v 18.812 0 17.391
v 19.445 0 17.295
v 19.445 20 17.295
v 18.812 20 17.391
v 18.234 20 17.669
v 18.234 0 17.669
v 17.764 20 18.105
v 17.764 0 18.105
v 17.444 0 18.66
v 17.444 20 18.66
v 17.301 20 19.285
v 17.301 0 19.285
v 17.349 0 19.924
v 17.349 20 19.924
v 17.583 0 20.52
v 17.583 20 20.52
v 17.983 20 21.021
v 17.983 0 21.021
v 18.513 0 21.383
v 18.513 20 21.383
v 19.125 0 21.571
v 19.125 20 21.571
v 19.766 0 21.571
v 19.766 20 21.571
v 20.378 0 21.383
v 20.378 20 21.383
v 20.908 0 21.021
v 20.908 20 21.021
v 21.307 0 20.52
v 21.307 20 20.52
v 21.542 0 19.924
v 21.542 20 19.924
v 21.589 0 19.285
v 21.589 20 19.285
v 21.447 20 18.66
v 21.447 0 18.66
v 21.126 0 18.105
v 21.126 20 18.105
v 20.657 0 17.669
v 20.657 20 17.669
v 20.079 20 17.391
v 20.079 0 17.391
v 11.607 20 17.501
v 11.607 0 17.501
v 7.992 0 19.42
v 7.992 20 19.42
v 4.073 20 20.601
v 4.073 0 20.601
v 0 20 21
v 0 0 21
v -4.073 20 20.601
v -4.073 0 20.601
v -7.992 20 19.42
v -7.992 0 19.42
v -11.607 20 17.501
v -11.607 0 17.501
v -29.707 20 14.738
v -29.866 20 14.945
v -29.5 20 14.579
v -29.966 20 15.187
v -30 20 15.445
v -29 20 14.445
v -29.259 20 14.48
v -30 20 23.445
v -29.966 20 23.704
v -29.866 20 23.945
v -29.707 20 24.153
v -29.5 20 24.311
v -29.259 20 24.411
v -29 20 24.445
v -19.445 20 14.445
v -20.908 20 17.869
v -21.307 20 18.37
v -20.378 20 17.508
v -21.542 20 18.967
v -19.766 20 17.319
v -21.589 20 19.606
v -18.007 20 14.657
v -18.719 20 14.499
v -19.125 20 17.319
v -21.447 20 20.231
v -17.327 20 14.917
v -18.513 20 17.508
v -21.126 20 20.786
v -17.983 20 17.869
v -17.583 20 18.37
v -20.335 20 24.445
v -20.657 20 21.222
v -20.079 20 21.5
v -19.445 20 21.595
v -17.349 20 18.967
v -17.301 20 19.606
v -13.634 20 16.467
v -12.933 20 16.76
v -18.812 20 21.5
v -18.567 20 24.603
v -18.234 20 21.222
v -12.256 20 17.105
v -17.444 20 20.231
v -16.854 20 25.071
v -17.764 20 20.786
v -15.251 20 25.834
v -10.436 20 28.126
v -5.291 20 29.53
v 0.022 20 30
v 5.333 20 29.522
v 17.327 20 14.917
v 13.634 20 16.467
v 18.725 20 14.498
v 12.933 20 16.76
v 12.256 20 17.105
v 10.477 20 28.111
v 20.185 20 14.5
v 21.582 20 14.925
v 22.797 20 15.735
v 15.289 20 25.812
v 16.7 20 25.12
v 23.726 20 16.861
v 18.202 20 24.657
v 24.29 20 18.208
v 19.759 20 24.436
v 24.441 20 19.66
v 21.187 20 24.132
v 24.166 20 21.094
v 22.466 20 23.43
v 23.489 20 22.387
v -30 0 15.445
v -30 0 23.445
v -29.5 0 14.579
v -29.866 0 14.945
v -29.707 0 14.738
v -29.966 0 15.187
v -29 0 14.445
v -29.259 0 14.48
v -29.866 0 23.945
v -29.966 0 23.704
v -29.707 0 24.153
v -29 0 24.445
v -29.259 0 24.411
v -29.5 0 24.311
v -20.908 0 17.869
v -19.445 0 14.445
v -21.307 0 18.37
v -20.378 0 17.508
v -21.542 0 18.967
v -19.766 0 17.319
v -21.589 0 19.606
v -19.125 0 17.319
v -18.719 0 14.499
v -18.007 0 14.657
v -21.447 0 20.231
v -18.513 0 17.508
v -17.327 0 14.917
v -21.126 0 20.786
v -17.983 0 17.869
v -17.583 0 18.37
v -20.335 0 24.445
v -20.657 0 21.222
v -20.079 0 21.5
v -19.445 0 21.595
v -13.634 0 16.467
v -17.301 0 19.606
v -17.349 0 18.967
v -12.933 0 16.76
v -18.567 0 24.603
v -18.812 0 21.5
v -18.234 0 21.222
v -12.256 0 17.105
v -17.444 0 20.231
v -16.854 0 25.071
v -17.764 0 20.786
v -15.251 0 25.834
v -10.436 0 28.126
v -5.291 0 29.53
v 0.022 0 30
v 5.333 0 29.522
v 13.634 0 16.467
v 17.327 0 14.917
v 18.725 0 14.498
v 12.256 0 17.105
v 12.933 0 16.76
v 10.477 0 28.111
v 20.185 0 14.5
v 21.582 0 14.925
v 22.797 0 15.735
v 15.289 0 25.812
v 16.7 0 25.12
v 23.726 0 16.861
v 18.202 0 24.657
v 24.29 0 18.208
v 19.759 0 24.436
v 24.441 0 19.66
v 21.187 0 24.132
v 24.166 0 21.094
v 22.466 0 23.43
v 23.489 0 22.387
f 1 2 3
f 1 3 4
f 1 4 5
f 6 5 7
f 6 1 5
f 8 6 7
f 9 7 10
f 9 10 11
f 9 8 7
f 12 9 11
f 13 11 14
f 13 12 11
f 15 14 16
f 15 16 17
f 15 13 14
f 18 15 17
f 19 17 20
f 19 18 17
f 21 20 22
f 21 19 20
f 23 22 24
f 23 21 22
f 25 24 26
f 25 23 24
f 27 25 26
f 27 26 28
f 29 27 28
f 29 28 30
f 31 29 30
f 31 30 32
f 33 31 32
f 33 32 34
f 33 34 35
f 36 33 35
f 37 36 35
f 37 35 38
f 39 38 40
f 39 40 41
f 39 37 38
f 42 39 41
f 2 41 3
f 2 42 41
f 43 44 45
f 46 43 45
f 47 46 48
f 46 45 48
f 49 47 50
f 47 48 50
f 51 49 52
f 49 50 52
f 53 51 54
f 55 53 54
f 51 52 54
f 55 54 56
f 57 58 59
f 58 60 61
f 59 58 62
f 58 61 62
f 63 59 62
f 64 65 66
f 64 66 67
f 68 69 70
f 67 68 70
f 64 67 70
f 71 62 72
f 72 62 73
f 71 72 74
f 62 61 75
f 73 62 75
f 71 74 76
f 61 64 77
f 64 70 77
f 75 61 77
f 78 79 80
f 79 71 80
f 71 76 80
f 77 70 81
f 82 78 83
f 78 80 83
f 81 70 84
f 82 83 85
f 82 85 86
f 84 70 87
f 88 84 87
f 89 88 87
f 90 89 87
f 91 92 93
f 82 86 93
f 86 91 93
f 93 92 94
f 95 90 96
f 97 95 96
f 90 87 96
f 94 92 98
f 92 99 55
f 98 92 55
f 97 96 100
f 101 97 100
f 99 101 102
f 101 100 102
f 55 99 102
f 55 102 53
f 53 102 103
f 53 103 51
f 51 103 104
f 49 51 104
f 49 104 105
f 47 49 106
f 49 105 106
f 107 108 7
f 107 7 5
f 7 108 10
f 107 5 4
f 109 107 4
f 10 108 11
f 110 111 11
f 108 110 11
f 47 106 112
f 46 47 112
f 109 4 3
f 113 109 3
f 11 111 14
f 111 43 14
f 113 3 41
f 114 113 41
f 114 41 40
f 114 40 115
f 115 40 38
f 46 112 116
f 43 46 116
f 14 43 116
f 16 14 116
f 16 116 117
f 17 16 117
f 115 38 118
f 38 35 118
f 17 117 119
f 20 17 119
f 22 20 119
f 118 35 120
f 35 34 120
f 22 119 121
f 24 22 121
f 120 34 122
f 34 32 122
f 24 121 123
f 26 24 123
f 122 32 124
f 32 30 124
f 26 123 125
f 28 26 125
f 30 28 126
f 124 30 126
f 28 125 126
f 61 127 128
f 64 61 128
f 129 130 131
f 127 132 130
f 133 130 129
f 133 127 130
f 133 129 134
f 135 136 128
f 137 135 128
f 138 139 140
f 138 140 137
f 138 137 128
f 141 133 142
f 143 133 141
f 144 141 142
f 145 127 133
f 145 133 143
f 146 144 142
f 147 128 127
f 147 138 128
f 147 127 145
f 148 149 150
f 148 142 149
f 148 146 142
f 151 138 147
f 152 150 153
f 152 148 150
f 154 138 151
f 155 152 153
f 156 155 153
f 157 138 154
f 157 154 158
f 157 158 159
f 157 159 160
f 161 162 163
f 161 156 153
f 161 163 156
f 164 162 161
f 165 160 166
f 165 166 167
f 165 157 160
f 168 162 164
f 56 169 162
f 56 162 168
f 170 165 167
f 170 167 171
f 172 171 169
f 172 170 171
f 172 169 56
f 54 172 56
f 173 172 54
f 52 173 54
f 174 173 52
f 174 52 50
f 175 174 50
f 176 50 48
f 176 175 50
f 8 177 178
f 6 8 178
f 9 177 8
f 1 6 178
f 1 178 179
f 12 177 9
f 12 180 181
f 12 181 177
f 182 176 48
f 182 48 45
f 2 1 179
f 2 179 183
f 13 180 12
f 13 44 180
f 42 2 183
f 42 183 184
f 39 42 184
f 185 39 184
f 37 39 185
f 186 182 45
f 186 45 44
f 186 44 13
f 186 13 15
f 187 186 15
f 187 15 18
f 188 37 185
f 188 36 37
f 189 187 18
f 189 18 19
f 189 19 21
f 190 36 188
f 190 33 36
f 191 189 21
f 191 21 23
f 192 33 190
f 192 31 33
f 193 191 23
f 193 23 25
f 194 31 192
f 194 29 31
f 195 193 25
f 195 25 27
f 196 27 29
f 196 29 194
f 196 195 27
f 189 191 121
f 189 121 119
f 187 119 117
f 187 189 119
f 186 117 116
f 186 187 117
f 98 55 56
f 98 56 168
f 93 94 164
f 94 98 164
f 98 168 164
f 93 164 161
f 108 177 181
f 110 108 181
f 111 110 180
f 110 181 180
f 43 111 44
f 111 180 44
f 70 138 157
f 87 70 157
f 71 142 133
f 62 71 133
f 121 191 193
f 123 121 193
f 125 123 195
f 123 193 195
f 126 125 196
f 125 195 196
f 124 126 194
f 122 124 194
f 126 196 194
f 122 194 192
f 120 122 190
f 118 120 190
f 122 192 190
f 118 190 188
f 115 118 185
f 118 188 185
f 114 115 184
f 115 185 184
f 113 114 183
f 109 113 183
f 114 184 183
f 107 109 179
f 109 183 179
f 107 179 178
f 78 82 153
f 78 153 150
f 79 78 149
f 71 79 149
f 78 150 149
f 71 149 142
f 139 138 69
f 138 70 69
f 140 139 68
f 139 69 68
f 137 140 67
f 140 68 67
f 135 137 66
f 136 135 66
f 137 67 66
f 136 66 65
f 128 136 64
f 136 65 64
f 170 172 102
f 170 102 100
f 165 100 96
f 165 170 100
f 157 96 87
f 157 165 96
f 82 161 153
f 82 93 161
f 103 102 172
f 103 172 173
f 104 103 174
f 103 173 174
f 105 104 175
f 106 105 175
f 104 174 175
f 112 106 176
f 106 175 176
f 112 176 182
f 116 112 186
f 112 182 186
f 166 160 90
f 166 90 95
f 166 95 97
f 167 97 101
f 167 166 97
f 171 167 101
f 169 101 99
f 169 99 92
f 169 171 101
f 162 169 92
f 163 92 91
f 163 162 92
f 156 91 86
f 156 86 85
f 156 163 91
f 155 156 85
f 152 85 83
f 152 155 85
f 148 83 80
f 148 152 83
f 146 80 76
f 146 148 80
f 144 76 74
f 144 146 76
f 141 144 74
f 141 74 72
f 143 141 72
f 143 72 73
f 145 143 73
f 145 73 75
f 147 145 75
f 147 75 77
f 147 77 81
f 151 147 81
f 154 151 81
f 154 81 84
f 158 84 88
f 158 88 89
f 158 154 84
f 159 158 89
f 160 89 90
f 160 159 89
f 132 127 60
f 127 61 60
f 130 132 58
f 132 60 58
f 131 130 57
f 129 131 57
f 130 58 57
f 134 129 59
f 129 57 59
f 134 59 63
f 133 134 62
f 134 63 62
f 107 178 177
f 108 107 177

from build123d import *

# Parameters (mm, degrees)
SKETCH_1_R      = 2.15
EXTRUDE_1_DEPTH = 20
FILLET_1_R      = 10
FILLET_2_R      = 50
FILLET_3_R      = 1


with BuildPart() as part:
    # ｽｹｯﾁ1 → ﾎﾞｽ - 押し出し1 (new body)
    with BuildSketch(Plane(origin=(0, 0, 0), x_dir=(1, 0, 0), z_dir=(0, 1, 0))):
        with BuildLine():
            Line((-30, -24.445436483), (-19.445436483, -24.445436483))
            ThreePointArc((-19.445436483, -24.445436483), (-18.602258519, -24.373828809), (-17.78323176, -24.161056851))
            ThreePointArc((-17.78323176, -24.161056851), (0, -30), (17.78323176, -24.161056851))
            ThreePointArc((17.78323176, -24.161056851), (24.321347518, -18.338417254), (15.909902577, -15.909902577))
            Line((15.909902577, -15.909902577), (14.849242405, -14.849242405))
            ThreePointArc((14.849242405, -14.849242405), (0, -21), (-14.849242405, -14.849242405))
            Line((-14.849242405, -14.849242405), (-15.909902577, -15.909902577))
            ThreePointArc((-15.909902577, -15.909902577), (-17.532019321, -14.82603882), (-19.445436483, -14.445436483))
            Line((-19.445436483, -14.445436483), (-30, -14.445436483))
            Line((-30, -14.445436483), (-30, -24.445436483))
        make_face()
        with Locations(Location((-19.445436483, -19.445436483, 0), (0, 0, 270))):
            Circle(SKETCH_1_R, mode=Mode.SUBTRACT)
        with Locations(Location((19.445436483, -19.445436483, 0), (0, 0, 90))):
            Circle(SKETCH_1_R, mode=Mode.SUBTRACT)
    extrude(amount=EXTRUDE_1_DEPTH)

    # ﾌｨﾚｯﾄ1
    # the kernel refuses this fillet: 10 mm, written as the material it adds along each edge
    with BuildSketch(Plane(origin=(17.78323176, 0, 24.161056851), x_dir=(-0.8339213468601729, 0, 0.5518833094512962), z_dir=(0, 1, 0))) as fillet_1_piece_1:
        with BuildLine():
            CenterArc((3.490042654, 9.987563289), FILLET_1_R, 240.094065847, 27.048110546)
            ThreePointArc((-1.495732566, 1.319112133), (-0.681431037, 0.734886554), (0, 0))
            ThreePointArc((0, 0), (1.495732566, 0.037310133), (2.991465132, 0))
        make_face()
    extrude(amount=20)
    with BuildSketch(Plane(origin=(-17.78323176, 0, 24.161056851), x_dir=(-0.9938473156865714, 0, 0.11075880598217346), z_dir=(0, 1, 0))) as fillet_1_piece_2:
        with BuildLine():
            CenterArc((3.675145817, 9.938473157), FILLET_1_R, 233.085304015, 30.555636739)
            Line((-2.331107377, 1.943166873), (-2.931732696, 1.143636244))
            ThreePointArc((-2.931732696, 1.143636244), (-1.781263353, 0.232951381), (-0.678328899, -0.734758399))
            Line((-0.678328899, -0.734758399), (0.225936244, -0.974142091))
            ThreePointArc((0.225936244, -0.974142091), (1.572716444, -0.895321193), (2.456798951, -0.993847316))
            Line((2.456798951, -0.993847316), (2.567557757, 0))
        make_face()
    extrude(amount=20)
    # the kernel refuses this fillet: 10 mm, written as the material it takes off along each edge
    with BuildSketch(Plane(origin=(-14.849242405, -10.471736153, 14.849242405), x_dir=(-0.707106781186226, 0, 0.7071067811868691), z_dir=(0, 1, 0))) as fillet_1_2_piece_1:
        with BuildLine():
            CenterArc((9.383333333, 6.15248369), FILLET_1_R, 191.447340283, 26.522629156)
            ThreePointArc((-0.417741935, 4.167811532), (-0.104696468, 2.094347231), (0, 0))
            Line((0, 0), (1.5, 0))
        make_face()
    extrude(amount=40.943472307, mode=Mode.SUBTRACT)
    with BuildSketch(Plane(origin=(14.849242405, -10.471736153, 14.849242405), x_dir=(-0.7741018071953127, 0, 0.6330611282466734), z_dir=(0, 1, 0))) as fillet_1_2_piece_2:
        with BuildLine():
            CenterArc((5.186002666, 9.950144539), FILLET_1_R, 237.753700702, 26.522629156)
            Line((-0.149596231, 1.492521681), (0, 0))
            ThreePointArc((0, 0), (2.094347231, 0.104696468), (4.188694461, 0))
        make_face()
    extrude(amount=40.943472307, mode=Mode.SUBTRACT)

    # ﾌｨﾚｯﾄ2
    fillet_2_edges = [part.edges().sort_by_distance(p)[0] for p in [
        (-15.909902577, 10, 15.909902577),
        (15.909902577, 10, 15.909902577),
    ]]
    fillet(fillet_2_edges, radius=FILLET_2_R)

    # ﾌｨﾚｯﾄ3
    fillet_3_edges = [part.edges().sort_by_distance(p)[0] for p in [
        (-30, 10, 14.445436483),
        (-30, 10, 24.445436483),
    ]]
    fillet(fillet_3_edges, radius=FILLET_3_R)


solid = part.part
